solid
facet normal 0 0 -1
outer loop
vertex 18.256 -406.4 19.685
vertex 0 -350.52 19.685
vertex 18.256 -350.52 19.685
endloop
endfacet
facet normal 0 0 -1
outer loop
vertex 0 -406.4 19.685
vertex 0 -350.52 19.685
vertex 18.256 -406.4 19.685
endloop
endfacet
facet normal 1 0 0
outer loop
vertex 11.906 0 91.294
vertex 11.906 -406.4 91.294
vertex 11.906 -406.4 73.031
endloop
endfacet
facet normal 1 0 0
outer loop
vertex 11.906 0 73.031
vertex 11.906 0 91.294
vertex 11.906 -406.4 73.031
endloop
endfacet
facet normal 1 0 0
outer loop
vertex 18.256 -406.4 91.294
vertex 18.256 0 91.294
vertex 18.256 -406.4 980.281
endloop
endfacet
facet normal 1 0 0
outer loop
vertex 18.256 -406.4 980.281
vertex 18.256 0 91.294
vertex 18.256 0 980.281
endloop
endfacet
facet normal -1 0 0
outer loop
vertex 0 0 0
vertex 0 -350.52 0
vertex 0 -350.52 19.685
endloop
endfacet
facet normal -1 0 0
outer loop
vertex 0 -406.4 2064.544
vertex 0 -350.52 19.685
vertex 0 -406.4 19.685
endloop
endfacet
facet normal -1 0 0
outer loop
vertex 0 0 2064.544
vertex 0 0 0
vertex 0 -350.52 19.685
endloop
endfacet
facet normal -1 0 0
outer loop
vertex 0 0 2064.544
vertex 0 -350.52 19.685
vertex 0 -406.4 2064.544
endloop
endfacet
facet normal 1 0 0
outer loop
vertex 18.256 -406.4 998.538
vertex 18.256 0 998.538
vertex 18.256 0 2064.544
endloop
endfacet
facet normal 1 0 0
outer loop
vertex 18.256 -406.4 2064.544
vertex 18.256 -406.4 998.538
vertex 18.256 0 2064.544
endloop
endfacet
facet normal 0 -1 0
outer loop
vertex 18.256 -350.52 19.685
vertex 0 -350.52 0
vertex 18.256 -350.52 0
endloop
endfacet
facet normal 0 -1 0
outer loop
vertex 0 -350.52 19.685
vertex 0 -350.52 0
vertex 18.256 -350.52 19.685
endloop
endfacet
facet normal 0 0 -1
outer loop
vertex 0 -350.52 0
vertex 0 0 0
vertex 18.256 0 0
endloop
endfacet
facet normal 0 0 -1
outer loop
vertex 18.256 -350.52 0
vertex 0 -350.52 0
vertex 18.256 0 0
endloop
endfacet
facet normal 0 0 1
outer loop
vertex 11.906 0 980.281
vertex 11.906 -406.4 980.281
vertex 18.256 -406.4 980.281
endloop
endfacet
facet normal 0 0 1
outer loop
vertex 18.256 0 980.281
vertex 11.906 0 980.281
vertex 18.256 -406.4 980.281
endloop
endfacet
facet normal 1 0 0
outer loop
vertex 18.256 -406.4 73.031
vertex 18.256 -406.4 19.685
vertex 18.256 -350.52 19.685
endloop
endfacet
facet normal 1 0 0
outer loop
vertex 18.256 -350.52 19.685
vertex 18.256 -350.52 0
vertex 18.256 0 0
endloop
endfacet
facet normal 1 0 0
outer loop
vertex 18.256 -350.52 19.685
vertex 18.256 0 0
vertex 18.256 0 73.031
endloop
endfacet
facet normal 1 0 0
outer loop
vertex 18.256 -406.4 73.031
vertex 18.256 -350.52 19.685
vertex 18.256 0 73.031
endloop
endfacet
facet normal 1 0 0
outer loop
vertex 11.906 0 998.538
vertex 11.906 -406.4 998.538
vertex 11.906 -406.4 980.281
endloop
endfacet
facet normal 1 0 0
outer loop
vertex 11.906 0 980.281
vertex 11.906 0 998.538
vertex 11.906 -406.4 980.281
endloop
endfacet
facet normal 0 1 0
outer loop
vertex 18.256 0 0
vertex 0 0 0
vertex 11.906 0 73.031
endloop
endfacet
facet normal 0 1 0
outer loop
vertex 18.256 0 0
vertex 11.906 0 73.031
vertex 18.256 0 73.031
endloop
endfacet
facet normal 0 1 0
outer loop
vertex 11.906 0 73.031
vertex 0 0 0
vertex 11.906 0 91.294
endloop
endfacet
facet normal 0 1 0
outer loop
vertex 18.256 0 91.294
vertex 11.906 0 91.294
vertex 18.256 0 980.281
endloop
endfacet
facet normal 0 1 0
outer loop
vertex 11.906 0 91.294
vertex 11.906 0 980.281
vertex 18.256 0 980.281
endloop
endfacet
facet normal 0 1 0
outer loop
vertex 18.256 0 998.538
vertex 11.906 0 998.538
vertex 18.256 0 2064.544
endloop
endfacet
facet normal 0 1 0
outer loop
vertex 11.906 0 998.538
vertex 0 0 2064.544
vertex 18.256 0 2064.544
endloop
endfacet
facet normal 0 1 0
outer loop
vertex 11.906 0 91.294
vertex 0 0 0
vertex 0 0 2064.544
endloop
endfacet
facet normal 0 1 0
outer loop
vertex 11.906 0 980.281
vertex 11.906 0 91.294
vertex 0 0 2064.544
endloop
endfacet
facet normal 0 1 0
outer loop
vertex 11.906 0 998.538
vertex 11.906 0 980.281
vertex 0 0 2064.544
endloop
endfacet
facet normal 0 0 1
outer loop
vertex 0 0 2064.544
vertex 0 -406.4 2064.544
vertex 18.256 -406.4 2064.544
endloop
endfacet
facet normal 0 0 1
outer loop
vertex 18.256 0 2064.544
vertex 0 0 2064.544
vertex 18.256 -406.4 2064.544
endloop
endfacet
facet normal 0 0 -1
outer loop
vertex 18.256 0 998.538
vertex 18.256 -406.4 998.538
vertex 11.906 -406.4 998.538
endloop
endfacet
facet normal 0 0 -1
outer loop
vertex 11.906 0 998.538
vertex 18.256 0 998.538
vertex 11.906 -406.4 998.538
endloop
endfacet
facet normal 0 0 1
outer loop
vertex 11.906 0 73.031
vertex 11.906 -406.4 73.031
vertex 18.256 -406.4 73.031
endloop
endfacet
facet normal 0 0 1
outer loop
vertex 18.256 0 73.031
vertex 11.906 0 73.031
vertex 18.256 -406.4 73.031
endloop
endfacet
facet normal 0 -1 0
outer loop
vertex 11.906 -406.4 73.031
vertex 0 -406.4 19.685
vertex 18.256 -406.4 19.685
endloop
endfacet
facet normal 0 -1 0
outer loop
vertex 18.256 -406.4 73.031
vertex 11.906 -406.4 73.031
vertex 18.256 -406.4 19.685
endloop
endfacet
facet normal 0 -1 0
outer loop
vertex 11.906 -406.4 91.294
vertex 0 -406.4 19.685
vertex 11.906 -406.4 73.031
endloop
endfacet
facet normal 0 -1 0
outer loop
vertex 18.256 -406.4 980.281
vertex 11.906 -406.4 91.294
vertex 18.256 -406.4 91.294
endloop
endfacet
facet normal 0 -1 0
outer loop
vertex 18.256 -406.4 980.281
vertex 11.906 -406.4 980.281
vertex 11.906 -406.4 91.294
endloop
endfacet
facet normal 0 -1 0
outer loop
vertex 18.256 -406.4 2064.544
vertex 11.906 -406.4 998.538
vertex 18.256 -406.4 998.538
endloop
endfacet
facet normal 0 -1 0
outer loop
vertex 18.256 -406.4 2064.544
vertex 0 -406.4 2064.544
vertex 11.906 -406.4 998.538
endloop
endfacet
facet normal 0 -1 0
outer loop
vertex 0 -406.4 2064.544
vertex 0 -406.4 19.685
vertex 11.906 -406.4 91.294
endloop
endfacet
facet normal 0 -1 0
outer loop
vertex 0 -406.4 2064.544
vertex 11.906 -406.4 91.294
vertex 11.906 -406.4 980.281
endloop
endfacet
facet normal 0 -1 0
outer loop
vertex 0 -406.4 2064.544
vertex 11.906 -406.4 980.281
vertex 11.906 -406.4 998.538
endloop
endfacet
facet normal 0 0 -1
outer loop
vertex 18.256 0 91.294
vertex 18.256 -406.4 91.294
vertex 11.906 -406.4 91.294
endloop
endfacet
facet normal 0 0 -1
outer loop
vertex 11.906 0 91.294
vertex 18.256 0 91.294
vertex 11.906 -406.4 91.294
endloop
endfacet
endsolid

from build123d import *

# Parameters (mm, degrees)
F0_W     = 18.25625
F0_H     = 2064.54375
F1_DEPTH = 406.4
F3_DEPTH = 406.4
F4_W     = 55.88
F4_H     = 19.685
F5_DEPTH = 25.4


with BuildPart() as f1:
    # F0 (on Front) → F1 (new body)
    with BuildSketch(Plane.XZ):
        with Locations((9.128125, 1032.271875)):
            Rectangle(F0_W, F0_H)
    extrude(amount=F1_DEPTH)

    # F2 (on face) → F3 (cut)
    with BuildSketch(Plane.XZ.offset(406.4)):
        Polygon((11.90625, 73.03135), (18.25625, 73.03135), (18.25625, 91.2876), (18.25625, 91.29395), (11.90625, 91.29395), align=None)
        Polygon((11.90625, 980.28125), (18.25625, 980.28125), (18.25625, 995.793984), (18.25625, 998.5375), (11.90625, 998.5375), align=None)
    extrude(amount=-F3_DEPTH, mode=Mode.SUBTRACT)

    # F4 (on face) → F5 (cut)
    with BuildSketch(Plane(origin=(0, 0, 0), x_dir=(0, -1, 0), z_dir=(-1, 0, 0))):
        with Locations((378.46, 9.8425)):
            Rectangle(F4_W, F4_H)
    extrude(amount=-F5_DEPTH, mode=Mode.SUBTRACT)


solid = f1.part
